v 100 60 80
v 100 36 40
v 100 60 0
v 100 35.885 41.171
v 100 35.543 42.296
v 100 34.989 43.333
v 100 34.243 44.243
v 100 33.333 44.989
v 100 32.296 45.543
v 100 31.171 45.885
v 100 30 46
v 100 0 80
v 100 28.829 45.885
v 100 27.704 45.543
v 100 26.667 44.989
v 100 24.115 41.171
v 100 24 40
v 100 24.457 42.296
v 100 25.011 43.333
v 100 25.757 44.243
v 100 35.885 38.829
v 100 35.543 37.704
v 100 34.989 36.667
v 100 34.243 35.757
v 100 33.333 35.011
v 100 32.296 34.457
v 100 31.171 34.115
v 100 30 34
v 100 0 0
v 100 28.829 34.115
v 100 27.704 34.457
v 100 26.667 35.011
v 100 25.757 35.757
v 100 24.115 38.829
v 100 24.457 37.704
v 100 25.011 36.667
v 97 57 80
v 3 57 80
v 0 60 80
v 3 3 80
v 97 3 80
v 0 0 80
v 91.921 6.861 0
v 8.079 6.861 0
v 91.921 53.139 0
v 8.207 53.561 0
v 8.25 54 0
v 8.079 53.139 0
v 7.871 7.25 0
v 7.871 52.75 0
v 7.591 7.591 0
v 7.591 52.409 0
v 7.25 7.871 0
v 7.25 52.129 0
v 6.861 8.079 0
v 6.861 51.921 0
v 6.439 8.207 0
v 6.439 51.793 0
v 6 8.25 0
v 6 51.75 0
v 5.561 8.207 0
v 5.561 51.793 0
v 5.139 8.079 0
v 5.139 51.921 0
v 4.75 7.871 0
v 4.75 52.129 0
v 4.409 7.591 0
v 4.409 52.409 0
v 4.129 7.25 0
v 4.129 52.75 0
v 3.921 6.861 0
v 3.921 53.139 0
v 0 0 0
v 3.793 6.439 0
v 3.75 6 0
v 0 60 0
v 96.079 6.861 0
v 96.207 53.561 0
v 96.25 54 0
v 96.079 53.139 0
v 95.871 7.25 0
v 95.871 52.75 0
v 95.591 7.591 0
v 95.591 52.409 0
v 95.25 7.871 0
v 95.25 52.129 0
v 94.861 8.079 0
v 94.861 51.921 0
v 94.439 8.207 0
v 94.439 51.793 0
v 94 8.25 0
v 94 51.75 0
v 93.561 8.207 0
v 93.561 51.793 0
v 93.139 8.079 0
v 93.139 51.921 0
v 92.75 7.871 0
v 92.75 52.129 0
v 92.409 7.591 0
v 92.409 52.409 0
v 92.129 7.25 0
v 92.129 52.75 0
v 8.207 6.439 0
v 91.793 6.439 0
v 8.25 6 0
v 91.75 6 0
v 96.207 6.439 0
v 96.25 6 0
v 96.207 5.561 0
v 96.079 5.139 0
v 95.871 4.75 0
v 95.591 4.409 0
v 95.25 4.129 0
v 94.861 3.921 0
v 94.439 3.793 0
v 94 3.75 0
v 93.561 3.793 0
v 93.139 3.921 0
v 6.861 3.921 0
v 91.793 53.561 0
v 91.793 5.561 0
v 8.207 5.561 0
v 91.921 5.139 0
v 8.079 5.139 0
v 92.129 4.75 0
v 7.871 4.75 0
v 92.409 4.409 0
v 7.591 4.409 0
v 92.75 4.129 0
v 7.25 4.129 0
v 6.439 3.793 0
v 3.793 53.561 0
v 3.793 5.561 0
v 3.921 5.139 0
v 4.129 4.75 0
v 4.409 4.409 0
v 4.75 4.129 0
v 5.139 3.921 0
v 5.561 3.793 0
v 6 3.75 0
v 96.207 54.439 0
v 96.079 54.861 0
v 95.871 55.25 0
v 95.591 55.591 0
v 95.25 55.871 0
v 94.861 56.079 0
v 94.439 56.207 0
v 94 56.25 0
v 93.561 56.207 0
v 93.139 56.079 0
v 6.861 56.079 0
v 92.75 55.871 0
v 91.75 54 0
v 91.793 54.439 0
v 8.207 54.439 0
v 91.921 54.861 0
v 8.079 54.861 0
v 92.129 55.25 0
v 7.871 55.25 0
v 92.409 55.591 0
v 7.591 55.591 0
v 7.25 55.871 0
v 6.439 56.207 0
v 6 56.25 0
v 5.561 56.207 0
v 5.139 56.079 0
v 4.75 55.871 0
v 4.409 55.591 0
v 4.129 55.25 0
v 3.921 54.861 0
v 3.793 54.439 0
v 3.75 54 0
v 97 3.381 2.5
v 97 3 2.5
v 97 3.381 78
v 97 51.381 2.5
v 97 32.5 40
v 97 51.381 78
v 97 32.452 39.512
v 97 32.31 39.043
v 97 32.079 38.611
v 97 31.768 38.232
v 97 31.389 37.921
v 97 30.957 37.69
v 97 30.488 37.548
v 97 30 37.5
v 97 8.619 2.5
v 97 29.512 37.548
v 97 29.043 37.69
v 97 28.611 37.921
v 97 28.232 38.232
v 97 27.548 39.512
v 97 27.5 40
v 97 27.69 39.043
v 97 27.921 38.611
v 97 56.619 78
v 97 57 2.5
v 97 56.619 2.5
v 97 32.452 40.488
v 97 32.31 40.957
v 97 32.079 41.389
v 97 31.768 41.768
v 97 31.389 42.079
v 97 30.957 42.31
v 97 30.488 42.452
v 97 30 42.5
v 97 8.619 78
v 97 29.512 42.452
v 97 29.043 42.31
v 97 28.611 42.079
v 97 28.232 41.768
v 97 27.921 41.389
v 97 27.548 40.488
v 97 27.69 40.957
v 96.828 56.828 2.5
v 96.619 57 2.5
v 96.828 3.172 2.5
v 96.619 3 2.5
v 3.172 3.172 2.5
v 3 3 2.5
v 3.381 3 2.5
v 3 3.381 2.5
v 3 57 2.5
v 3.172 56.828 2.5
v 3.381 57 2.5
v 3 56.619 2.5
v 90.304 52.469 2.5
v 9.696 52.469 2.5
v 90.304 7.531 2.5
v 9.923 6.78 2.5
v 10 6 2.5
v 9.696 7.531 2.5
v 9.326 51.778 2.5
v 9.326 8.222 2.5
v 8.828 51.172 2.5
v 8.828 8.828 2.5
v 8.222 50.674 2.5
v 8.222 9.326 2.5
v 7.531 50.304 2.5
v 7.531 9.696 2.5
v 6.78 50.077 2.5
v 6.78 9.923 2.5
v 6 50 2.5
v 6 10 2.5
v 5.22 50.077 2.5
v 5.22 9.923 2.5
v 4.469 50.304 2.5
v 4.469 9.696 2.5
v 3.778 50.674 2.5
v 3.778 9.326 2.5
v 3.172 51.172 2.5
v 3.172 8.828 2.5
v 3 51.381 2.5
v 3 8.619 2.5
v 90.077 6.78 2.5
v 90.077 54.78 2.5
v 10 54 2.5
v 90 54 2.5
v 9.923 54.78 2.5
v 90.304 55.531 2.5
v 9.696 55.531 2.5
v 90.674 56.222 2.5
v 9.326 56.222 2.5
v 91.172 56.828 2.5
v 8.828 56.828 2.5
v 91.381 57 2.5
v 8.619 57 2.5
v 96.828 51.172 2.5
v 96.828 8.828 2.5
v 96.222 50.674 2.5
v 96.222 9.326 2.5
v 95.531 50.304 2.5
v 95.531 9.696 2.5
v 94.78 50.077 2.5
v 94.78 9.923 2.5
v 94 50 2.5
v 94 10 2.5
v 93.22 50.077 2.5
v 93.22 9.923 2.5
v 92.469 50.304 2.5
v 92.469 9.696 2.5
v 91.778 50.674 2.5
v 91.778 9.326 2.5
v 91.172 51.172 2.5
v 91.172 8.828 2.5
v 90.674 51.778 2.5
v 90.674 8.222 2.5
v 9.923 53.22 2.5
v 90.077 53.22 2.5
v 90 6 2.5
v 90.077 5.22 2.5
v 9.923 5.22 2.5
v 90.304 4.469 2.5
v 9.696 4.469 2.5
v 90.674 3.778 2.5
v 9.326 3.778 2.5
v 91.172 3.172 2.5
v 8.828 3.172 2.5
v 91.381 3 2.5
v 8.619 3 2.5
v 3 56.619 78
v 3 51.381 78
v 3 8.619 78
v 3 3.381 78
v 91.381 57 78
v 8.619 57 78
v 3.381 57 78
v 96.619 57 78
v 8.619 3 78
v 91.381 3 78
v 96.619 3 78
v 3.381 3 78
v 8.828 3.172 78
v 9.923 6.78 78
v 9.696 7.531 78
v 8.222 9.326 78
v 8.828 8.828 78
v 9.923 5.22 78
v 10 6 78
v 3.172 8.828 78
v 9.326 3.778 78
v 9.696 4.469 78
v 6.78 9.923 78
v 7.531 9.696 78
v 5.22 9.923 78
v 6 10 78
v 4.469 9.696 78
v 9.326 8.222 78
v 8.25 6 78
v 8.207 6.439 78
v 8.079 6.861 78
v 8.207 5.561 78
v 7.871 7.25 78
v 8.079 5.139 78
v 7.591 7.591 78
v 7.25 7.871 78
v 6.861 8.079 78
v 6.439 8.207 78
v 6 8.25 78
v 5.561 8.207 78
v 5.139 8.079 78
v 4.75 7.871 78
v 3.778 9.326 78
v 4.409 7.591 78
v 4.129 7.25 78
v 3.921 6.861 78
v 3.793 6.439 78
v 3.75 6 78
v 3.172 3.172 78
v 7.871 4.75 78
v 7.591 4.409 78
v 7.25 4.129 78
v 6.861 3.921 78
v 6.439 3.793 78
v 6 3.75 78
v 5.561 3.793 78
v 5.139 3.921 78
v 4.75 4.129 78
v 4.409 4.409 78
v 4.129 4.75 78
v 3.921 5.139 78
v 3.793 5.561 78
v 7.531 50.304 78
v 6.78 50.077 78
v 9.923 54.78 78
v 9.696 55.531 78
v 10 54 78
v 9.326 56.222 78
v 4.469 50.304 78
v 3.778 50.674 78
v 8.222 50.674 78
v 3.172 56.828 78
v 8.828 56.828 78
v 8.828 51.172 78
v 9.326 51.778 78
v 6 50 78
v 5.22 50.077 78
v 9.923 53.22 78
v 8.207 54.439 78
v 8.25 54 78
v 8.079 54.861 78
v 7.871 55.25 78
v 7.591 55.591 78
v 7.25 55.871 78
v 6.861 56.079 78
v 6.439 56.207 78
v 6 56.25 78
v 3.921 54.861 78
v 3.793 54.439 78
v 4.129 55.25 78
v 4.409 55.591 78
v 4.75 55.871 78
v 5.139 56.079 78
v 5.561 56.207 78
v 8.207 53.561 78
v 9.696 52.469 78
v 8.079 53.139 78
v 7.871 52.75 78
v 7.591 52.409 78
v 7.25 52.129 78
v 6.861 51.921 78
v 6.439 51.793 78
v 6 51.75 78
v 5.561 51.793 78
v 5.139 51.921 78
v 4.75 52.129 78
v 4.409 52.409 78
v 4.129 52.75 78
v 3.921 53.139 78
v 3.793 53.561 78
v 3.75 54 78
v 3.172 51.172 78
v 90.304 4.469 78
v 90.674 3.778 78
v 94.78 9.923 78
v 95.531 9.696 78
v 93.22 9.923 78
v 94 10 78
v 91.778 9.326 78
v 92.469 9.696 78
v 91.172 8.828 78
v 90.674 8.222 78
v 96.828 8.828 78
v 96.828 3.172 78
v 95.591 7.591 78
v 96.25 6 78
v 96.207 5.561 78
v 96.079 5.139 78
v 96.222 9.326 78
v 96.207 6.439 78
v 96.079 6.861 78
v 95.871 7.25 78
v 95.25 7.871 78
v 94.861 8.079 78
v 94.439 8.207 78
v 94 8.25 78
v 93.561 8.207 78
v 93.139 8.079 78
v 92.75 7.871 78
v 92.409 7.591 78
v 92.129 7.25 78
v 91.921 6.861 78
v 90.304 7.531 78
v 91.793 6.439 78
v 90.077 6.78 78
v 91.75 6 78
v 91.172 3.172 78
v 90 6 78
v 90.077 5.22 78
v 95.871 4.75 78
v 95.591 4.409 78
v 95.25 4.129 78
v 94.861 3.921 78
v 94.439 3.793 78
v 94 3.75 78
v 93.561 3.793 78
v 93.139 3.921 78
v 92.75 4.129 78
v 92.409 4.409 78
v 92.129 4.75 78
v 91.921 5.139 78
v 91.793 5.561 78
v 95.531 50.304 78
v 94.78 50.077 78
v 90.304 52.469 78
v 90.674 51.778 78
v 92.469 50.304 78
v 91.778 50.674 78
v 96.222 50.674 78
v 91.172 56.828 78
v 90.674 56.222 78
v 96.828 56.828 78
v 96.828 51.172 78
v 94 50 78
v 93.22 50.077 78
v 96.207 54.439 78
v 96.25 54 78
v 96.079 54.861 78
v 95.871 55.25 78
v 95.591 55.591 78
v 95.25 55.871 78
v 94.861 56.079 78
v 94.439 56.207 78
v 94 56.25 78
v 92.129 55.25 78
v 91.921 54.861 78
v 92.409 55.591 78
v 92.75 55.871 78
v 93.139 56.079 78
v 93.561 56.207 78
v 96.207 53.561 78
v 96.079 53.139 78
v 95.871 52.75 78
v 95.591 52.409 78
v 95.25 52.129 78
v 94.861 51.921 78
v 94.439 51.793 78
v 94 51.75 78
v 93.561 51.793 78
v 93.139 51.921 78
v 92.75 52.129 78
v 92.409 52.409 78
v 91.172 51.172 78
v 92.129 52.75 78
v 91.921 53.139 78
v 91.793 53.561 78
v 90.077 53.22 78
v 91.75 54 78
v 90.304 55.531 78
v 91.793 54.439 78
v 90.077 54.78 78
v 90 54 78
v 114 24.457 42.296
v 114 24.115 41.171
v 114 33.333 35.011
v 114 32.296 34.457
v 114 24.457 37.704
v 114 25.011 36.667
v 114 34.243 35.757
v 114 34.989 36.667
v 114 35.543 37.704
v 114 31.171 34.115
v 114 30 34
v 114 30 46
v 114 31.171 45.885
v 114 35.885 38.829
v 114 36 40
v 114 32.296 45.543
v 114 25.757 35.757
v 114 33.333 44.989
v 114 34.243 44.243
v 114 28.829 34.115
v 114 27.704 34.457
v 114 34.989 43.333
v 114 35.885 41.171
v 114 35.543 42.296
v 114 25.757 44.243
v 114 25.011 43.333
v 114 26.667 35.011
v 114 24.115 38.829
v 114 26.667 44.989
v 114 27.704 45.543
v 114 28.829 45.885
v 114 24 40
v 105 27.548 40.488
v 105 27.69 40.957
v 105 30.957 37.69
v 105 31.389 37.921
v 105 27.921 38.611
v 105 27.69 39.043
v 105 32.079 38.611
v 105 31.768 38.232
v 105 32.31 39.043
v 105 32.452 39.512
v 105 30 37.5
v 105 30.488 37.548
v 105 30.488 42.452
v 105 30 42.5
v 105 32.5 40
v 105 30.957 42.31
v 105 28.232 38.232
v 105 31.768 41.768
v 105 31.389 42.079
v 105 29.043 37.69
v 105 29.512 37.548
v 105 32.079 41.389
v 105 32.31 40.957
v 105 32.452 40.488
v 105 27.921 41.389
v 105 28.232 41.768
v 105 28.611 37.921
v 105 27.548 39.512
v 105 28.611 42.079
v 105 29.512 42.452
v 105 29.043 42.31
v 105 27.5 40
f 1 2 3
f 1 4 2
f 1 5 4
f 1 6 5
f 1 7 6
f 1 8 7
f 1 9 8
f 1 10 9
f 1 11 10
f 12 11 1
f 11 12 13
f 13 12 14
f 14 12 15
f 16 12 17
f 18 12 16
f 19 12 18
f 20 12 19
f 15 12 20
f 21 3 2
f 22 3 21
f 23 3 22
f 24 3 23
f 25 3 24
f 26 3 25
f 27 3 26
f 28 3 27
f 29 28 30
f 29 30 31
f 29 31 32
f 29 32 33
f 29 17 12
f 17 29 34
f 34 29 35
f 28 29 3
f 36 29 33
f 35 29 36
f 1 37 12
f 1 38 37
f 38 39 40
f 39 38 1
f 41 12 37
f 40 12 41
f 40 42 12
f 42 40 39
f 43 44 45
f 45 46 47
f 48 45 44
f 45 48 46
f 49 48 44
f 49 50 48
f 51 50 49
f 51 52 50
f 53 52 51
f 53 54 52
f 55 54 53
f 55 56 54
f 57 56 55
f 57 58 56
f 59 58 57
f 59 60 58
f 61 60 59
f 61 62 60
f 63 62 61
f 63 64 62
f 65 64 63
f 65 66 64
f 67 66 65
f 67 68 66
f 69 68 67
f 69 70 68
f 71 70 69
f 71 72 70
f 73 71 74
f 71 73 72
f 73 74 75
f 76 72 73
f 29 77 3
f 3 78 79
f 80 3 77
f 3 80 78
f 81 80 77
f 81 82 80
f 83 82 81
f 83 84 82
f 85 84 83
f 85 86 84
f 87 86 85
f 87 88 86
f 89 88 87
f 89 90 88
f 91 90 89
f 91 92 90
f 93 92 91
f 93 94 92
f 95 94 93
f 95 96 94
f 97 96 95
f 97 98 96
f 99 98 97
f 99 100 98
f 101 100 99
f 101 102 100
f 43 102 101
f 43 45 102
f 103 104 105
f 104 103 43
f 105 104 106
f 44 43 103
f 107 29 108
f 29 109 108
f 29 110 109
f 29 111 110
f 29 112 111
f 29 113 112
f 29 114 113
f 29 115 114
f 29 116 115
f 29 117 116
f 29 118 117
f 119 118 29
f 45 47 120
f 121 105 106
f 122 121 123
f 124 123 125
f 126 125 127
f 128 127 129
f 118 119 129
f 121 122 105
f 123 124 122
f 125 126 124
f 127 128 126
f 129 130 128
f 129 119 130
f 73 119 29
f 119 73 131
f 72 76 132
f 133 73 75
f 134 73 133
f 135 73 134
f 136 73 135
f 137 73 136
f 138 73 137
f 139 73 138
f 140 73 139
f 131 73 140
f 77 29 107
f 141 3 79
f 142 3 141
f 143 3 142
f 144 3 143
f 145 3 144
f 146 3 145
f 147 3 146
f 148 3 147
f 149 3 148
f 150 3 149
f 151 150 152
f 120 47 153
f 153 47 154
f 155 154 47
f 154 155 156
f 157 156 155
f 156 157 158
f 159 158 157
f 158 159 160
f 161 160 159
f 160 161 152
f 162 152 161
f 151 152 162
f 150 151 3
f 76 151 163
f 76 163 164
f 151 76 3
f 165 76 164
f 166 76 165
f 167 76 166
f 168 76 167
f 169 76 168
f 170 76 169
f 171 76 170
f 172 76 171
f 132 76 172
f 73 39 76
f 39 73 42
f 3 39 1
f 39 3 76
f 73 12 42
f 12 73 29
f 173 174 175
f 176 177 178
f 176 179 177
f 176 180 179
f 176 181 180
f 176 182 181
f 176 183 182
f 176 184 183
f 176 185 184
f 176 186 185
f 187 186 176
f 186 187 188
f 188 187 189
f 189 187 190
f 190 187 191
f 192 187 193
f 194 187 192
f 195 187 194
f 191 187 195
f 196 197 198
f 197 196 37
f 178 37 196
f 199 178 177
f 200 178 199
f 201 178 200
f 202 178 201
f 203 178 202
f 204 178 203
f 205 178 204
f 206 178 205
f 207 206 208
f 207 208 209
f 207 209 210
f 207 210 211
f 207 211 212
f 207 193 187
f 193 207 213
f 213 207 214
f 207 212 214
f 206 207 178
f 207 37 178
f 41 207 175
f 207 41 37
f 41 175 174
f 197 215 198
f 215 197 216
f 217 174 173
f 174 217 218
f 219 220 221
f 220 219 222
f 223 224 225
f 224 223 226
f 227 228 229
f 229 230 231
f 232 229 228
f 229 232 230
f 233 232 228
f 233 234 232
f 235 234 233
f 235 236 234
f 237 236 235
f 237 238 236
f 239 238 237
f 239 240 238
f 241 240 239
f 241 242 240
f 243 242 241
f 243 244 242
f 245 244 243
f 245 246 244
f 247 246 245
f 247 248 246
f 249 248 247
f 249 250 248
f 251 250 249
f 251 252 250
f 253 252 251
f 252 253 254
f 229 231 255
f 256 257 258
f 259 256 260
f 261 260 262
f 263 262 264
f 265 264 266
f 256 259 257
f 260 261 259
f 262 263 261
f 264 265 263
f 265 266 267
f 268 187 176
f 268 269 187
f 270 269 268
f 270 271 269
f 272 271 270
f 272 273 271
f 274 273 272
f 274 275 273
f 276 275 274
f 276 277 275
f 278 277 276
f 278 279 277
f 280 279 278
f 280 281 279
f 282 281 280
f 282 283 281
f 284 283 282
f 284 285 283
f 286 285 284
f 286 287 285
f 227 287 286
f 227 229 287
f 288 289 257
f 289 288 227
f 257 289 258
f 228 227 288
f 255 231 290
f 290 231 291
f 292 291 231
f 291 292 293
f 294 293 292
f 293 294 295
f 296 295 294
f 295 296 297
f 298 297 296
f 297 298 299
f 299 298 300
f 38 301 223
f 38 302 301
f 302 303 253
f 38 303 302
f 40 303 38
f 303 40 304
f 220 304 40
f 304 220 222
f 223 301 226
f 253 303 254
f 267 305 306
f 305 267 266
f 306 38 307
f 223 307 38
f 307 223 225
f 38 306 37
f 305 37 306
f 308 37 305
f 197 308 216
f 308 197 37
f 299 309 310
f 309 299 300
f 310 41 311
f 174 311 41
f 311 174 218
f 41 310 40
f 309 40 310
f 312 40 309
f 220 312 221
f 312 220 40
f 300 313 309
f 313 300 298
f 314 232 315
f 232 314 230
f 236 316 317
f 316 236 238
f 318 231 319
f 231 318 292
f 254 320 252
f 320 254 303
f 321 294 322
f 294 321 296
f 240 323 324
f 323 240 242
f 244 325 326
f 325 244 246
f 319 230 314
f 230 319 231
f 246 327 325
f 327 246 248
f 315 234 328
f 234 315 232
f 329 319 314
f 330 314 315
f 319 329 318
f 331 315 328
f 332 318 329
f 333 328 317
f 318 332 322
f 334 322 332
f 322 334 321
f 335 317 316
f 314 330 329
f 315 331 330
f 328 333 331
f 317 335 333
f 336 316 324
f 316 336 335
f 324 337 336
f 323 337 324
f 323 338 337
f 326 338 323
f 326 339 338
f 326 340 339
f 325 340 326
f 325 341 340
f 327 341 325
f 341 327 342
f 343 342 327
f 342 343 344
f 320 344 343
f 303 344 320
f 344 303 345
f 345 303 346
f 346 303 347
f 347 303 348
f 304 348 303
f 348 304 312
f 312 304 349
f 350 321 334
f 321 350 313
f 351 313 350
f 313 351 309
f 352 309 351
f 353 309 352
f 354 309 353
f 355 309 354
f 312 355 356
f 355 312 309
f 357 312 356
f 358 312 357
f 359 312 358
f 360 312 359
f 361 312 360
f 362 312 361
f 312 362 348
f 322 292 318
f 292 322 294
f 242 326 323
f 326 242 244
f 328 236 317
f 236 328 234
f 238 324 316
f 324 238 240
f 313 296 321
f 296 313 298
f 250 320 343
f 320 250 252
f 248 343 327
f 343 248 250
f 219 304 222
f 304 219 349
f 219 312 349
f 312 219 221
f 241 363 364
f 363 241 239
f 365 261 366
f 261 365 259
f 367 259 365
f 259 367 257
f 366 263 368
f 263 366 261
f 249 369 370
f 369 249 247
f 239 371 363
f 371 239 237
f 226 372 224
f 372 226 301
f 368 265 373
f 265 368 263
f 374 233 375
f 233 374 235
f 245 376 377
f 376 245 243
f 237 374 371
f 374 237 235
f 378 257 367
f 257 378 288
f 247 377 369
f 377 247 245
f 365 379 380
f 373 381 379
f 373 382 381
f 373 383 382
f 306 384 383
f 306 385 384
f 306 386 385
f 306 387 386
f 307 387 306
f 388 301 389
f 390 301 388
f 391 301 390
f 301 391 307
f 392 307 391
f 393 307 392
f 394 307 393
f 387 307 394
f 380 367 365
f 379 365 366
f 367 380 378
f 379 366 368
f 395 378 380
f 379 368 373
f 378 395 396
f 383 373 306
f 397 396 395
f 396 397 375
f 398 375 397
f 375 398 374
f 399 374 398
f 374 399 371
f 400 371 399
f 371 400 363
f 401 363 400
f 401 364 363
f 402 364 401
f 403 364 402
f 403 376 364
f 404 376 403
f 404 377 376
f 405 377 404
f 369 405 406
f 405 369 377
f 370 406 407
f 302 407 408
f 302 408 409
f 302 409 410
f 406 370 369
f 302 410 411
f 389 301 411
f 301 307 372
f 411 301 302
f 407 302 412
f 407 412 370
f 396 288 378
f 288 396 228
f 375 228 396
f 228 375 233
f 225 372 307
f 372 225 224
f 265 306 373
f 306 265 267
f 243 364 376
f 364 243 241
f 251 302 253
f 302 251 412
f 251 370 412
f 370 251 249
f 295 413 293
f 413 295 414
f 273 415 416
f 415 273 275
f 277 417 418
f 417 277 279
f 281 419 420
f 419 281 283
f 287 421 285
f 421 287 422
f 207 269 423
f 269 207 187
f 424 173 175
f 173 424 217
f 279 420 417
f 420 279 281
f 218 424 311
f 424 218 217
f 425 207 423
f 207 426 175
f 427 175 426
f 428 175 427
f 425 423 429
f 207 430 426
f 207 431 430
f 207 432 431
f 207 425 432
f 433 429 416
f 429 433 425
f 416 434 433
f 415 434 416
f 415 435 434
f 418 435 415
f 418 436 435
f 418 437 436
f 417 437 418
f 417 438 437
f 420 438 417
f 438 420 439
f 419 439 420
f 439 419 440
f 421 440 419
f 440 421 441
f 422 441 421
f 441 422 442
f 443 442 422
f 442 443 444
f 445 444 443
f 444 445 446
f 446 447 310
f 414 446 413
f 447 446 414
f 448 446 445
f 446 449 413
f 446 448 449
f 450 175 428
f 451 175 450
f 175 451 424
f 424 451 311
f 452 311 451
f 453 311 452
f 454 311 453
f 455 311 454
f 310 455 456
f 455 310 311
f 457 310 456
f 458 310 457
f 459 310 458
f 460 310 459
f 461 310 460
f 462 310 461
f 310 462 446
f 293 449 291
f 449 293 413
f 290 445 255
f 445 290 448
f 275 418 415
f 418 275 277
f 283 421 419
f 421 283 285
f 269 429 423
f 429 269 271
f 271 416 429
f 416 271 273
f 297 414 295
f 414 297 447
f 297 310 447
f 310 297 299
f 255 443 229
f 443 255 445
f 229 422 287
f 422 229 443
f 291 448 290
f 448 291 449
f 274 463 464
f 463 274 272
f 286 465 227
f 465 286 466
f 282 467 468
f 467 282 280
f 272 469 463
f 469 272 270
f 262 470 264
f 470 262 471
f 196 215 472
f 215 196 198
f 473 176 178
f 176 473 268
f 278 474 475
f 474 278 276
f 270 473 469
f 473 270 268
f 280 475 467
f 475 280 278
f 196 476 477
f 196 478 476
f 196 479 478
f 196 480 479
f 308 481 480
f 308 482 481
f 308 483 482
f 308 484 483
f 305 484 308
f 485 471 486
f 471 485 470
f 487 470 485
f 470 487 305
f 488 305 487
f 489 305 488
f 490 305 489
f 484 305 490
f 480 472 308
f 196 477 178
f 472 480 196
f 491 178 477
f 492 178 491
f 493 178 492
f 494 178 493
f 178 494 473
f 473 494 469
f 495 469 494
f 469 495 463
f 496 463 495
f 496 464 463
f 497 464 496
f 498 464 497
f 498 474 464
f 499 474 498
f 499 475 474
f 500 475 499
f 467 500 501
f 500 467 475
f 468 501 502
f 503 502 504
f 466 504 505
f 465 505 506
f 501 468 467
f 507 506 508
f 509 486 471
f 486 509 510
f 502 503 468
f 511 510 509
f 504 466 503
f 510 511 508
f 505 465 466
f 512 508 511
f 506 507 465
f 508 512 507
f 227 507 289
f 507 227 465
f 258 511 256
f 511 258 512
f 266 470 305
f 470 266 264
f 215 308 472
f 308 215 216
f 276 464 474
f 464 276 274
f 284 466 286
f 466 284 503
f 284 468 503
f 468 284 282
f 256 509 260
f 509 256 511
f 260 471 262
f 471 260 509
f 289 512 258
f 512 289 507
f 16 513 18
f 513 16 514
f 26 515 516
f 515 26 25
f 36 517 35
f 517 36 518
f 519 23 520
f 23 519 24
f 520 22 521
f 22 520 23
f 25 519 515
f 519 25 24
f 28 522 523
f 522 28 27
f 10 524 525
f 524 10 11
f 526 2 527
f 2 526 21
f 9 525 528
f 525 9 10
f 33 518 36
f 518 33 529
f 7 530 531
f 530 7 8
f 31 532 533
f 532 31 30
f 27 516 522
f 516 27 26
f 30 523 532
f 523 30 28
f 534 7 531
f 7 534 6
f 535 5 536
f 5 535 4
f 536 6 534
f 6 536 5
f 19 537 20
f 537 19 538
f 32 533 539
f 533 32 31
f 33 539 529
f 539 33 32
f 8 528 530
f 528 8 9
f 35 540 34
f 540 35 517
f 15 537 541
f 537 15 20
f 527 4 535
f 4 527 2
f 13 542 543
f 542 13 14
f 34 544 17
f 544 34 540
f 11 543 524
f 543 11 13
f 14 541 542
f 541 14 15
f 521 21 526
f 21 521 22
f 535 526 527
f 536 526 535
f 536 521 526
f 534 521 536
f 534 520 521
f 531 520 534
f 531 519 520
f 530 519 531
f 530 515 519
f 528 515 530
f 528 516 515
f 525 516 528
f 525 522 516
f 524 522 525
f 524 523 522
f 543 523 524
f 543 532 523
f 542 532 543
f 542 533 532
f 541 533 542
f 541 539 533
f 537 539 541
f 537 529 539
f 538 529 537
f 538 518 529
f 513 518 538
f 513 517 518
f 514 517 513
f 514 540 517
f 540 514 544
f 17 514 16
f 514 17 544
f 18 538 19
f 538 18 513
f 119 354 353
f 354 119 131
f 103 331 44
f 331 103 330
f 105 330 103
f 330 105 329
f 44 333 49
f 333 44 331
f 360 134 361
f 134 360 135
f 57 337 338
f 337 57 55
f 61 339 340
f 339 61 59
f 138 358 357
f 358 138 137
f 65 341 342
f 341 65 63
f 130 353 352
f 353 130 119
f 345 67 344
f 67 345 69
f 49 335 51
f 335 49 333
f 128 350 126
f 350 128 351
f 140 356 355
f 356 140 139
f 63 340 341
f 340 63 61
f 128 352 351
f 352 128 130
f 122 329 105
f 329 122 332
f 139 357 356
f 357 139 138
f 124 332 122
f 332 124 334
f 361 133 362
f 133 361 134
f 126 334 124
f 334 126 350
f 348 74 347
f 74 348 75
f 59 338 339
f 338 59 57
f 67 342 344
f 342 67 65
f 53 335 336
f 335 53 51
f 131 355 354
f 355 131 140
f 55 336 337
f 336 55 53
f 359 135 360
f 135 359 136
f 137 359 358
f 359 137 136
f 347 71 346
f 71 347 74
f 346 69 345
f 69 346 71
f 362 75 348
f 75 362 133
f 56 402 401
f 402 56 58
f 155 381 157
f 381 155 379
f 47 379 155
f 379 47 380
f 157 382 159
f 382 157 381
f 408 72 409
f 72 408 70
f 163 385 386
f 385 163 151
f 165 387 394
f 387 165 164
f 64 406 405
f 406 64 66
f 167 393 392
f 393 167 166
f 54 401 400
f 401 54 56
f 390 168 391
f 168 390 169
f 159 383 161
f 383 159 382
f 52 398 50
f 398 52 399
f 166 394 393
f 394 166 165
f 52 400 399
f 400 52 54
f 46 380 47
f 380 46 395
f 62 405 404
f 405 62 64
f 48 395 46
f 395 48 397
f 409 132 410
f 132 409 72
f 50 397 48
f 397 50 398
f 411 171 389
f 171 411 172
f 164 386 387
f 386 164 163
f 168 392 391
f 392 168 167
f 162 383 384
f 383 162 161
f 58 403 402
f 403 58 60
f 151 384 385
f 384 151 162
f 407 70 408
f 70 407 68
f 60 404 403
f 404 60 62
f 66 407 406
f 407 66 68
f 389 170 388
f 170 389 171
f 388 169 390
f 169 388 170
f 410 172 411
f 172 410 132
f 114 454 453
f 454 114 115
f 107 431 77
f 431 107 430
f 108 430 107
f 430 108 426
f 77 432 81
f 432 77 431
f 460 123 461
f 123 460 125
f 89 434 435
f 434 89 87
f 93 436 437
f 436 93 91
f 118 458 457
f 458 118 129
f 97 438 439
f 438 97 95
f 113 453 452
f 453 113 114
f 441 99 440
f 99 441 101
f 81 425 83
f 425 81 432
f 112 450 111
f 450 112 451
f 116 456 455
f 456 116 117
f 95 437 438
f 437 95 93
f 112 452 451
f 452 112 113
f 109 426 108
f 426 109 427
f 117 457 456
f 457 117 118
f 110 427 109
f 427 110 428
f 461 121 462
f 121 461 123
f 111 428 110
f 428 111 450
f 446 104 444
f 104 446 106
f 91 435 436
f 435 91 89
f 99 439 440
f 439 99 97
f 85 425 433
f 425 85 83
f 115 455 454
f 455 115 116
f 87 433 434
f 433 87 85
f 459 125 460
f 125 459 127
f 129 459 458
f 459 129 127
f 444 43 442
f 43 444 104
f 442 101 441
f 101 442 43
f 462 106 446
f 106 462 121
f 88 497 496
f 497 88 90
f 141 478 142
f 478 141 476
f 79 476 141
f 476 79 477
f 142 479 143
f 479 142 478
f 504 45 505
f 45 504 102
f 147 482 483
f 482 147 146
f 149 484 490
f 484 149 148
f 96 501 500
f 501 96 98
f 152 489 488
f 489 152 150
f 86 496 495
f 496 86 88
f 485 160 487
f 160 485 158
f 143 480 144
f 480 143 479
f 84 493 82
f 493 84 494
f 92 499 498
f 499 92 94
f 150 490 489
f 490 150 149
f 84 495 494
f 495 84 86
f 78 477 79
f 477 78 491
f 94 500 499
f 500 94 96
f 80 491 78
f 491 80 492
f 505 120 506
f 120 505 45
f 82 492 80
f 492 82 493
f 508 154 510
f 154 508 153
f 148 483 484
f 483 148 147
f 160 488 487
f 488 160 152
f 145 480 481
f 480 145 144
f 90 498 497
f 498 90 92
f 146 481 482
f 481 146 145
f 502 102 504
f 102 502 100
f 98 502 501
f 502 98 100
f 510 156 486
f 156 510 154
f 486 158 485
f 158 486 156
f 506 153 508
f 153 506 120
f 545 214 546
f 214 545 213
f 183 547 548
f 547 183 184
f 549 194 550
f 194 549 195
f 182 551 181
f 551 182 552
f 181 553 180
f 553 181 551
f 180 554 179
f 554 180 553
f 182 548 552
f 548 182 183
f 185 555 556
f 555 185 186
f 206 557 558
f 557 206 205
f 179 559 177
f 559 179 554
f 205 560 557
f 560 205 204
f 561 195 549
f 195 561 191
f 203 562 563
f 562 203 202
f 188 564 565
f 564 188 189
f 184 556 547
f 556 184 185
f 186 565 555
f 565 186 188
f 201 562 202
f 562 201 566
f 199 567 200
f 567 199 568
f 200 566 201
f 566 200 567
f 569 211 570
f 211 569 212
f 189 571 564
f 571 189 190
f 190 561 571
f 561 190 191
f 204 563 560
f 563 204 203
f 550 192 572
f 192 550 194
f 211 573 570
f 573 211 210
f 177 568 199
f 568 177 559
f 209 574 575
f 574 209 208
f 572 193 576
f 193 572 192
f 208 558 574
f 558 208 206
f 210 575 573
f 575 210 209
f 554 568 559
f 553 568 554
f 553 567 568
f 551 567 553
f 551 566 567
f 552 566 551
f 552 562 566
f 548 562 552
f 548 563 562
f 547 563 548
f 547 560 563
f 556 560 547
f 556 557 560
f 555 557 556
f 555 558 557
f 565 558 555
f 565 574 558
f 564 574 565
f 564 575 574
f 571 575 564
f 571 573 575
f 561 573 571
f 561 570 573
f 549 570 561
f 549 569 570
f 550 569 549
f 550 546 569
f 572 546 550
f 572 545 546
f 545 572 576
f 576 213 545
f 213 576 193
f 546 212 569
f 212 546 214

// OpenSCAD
$fn = 32;

// ----------------------------------------------------------------------
// Enclosure body: 100 x 60 x 80 mm, wall 3 mm
// ----------------------------------------------------------------------

// --- parameters (mm) ---
length = 100;             // outside length, X
width = 60;               // outside width, Y
height = 80;              // outside height, Z
wall = 3;                 // side wall thickness
floor_t = 2.5;            // floor thickness
boss_d = 8;               // corner boss diameter
boss_h = 75.5;            // corner boss height above the floor
boss_hole_d = 4.5;        // lid screw clearance in the boss
boss_lip = 6;             // boss centre inset from the corner
nipple_d = 12;            // cable gland boss diameter
nipple_h = 14;            // cable gland boss height
nipple_bore = 5;          // cable gland bore

module shell() {
  difference() {
    cube([length, width, height]);
    /* hollow, open at the top */
    translate([wall, wall, floor_t])
      cube([length - 2 * wall, width - 2 * wall, height]);
  }
}

module bosses() {
  /* corner bosses, sunk 1 mm into the floor */
  for (sx = [0, 1]) for (sy = [0, 1])
    translate([sx * (length - 2 * boss_lip) + boss_lip, sy * (width - 2 * boss_lip) + boss_lip, floor_t - 1])
      cylinder(h = boss_h + 1, d = boss_d);
}

module gland() {
  /* boss on the short wall, sunk 1 mm into it */
  translate([length - 1, width / 2, height * 0.5]) rotate([0, 90, 0])
    cylinder(h = nipple_h + 1, d = nipple_d);
}

difference() {
  union() {
    shell();
    bosses();
    gland();
  }
  /* boss screw holes */
  for (sx = [0, 1]) for (sy = [0, 1])
    translate([sx * (length - 2 * boss_lip) + boss_lip, sy * (width - 2 * boss_lip) + boss_lip, -1]) cylinder(h = floor_t + boss_h + 2, d = boss_hole_d);
  translate([length, width / 2, height * 0.5]) rotate([0, 90, 0]) translate([0, 0, -nipple_h - 2]) cylinder(h = nipple_h + wall + 4, d = nipple_bore);
}
